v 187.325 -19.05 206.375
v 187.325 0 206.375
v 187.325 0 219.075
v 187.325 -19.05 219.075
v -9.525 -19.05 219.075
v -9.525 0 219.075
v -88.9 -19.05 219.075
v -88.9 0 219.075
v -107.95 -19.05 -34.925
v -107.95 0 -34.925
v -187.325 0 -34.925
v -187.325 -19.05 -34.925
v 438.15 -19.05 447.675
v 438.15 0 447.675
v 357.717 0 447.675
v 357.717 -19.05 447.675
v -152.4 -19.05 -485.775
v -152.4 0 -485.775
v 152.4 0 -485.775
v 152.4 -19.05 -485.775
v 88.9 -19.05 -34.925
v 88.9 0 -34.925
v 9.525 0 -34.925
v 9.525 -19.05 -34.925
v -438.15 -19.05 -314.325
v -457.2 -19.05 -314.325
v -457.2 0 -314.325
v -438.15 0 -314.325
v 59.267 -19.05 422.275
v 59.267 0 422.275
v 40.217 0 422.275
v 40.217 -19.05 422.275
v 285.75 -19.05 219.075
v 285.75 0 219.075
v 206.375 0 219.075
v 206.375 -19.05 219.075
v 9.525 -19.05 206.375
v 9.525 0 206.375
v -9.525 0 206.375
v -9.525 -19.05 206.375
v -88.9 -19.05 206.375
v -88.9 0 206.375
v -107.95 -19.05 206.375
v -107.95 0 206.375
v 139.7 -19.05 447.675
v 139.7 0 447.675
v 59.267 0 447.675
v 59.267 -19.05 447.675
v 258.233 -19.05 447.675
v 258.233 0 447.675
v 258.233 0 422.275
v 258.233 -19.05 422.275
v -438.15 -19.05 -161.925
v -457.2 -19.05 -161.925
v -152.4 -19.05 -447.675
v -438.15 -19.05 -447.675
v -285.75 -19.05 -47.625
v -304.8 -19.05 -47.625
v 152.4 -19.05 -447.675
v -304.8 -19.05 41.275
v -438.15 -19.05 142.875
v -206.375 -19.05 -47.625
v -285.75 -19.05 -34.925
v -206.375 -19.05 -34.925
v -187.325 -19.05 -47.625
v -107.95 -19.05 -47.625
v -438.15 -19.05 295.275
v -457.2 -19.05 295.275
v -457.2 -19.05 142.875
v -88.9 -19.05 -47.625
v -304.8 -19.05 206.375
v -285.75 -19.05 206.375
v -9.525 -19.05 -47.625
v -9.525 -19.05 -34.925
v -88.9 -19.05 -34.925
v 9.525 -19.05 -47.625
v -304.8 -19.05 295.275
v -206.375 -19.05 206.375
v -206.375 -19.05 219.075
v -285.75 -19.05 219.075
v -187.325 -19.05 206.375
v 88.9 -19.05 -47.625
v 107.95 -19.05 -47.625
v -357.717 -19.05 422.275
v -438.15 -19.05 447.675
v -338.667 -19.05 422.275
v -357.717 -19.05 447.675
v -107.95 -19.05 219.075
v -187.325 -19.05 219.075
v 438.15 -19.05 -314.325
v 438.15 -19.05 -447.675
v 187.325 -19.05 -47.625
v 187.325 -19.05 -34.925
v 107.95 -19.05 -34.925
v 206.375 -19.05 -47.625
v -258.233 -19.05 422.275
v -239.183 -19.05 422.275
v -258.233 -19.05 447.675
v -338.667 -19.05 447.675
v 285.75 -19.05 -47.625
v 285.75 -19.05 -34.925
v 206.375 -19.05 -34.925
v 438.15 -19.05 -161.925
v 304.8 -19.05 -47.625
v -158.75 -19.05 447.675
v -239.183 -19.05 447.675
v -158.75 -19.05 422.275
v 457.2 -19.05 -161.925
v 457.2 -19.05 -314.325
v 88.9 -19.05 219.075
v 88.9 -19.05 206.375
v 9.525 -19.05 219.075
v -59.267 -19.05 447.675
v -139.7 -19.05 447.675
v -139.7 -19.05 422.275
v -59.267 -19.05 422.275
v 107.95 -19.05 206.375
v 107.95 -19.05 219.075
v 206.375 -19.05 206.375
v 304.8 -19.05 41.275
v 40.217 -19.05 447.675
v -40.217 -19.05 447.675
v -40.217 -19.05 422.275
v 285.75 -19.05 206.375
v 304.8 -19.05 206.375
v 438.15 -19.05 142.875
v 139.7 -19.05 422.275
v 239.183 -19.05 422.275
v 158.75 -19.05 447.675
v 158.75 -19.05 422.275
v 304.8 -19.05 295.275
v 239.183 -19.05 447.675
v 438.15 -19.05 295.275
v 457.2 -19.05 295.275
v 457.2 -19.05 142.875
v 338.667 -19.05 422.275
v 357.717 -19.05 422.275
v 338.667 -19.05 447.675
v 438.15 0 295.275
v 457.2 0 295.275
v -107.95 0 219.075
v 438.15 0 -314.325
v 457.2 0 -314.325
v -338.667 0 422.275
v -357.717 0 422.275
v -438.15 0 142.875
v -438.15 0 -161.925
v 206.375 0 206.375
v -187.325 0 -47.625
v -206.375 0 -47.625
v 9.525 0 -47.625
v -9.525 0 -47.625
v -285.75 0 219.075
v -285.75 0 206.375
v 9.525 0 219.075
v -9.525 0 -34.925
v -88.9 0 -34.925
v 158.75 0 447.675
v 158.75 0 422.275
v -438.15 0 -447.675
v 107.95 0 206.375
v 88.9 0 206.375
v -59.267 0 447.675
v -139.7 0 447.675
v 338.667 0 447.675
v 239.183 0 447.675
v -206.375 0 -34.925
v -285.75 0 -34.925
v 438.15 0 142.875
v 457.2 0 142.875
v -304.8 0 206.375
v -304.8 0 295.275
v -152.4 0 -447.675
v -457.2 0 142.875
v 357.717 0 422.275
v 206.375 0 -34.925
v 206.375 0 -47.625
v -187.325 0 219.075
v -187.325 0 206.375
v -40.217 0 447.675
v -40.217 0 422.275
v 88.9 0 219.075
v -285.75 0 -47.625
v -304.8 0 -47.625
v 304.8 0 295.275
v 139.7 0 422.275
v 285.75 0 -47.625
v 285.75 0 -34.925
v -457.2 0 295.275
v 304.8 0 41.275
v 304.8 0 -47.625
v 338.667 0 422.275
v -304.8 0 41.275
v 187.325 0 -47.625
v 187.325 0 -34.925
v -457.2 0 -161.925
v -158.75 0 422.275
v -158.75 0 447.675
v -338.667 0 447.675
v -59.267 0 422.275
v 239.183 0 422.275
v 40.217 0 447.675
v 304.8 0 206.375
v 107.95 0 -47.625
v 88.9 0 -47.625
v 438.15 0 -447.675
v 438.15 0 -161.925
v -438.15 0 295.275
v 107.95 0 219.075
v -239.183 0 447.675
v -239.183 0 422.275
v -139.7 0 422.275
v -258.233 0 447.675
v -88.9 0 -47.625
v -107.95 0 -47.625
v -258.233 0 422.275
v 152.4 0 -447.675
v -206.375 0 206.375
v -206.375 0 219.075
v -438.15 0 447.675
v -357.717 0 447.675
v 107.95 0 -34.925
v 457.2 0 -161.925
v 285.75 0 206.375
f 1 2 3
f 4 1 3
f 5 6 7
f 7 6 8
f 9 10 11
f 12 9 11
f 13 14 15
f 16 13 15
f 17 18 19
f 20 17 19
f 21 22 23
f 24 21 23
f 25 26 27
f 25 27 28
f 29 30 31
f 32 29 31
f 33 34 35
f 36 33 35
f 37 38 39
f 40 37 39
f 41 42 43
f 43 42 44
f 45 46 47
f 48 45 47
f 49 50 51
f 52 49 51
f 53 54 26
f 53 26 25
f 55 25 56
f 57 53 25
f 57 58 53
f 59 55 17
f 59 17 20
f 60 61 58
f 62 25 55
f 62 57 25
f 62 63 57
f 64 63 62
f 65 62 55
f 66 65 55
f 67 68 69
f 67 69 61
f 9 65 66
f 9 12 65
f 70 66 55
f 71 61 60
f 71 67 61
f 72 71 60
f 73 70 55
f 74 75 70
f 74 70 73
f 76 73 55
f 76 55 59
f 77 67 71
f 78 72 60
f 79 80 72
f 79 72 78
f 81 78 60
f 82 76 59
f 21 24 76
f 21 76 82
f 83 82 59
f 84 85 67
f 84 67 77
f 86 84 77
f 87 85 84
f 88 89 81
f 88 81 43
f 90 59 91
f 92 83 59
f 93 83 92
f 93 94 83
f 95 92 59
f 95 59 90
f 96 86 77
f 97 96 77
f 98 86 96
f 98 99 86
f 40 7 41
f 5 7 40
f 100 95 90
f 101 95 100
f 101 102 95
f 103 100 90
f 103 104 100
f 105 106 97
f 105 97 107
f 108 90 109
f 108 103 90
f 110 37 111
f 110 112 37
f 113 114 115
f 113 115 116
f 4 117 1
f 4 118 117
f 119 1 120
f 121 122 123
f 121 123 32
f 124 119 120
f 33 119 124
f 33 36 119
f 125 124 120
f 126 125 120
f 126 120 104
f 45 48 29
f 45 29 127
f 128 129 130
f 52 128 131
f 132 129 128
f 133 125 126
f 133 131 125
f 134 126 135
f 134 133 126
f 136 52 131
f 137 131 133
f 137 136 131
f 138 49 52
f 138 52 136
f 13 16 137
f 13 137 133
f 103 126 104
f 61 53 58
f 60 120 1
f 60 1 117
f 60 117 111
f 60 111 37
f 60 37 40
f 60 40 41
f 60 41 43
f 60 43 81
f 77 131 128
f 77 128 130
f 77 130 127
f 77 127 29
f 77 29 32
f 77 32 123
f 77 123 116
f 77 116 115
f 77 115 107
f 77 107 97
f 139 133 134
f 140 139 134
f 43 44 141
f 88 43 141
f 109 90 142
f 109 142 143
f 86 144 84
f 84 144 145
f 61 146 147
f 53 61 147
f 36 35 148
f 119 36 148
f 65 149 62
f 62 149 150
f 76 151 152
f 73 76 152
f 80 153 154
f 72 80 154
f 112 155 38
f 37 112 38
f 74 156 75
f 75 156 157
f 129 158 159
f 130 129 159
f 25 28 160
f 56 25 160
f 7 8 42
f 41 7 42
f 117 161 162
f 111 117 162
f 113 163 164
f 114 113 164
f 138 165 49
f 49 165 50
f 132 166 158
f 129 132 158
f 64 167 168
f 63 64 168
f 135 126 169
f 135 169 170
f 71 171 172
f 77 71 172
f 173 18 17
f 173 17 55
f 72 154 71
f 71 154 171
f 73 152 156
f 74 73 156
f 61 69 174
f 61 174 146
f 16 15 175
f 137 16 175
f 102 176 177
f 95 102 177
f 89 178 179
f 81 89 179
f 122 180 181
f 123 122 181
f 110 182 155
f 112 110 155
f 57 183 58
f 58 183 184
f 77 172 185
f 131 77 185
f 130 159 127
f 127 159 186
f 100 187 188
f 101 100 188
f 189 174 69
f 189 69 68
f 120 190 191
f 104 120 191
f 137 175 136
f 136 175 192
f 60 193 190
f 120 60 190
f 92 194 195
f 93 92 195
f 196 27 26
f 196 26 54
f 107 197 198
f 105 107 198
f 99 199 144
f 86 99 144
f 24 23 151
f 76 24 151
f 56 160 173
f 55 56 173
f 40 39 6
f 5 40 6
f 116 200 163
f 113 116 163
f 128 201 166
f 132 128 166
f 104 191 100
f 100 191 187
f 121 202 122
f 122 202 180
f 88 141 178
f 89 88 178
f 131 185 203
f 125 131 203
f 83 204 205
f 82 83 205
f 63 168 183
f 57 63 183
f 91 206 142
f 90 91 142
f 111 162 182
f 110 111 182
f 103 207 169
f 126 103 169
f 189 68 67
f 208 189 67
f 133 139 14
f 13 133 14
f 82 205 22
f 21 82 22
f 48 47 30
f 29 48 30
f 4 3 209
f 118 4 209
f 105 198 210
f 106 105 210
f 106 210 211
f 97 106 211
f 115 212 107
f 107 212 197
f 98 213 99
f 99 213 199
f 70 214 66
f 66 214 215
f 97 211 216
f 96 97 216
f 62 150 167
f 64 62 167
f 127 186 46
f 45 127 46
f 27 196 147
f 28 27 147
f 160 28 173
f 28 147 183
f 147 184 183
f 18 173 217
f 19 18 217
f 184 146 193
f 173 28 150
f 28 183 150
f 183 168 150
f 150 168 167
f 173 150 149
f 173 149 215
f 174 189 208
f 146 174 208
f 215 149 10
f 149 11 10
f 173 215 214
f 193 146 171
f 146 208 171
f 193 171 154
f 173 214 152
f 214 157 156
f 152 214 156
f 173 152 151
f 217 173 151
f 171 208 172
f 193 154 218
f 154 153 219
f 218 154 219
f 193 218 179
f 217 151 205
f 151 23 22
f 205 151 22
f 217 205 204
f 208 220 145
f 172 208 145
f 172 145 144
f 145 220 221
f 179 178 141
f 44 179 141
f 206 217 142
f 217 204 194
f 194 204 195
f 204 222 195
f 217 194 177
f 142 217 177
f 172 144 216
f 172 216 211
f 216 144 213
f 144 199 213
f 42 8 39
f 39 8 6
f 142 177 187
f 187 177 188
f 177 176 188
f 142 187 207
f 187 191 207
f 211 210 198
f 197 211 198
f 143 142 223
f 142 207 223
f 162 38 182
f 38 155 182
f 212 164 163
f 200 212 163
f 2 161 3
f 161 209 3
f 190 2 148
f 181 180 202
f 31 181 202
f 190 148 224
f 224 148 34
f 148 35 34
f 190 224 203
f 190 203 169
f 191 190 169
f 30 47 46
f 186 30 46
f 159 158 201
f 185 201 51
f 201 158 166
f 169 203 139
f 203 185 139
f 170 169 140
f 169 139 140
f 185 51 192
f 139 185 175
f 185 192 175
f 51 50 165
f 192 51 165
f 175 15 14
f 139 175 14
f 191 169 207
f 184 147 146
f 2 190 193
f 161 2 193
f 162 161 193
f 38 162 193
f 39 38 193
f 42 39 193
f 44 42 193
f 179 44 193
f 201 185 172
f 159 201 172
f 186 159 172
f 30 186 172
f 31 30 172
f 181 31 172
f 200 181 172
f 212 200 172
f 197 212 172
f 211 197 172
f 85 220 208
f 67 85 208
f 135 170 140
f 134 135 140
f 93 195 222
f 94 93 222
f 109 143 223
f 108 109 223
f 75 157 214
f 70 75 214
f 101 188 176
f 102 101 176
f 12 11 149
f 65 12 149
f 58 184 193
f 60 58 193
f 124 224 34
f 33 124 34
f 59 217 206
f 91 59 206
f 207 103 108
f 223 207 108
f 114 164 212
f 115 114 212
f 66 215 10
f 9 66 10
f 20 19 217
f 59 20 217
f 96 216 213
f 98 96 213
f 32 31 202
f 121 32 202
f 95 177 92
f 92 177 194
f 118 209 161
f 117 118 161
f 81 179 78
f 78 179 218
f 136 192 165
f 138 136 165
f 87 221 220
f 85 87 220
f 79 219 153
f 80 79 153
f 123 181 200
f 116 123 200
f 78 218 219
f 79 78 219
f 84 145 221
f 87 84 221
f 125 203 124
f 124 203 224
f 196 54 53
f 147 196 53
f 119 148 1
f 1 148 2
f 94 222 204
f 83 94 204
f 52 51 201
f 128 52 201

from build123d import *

# Parameters (mm, degrees)
F0_W     = 19.05
F0_H     = 152.4
F0_W_2   = 304.8
F0_H_2   = 38.1
F1_DEPTH = 19.05


# Not quite as in the source:
# - a feature names something its author has since deleted; it is built from what else it names


with BuildPart() as f1:
    # F0 (on Front) → F1 (new body)
    with BuildSketch(Plane.XZ):
        Polygon((-438.15, -314.325), (-438.15, -447.675), (-152.4, -447.675), (152.4, -447.675), (438.15, -447.675), (438.15, -314.325), (438.15, -161.925), (438.15, 142.875), (438.15, 295.275), (438.15, 447.675), (357.7166666667, 447.675), (357.7166666667, 422.275), (338.6666666667, 422.275), (338.6666666667, 447.675), (258.2333333333, 447.675), (258.2333333333, 422.275), (239.1833333333, 422.275), (239.1833333333, 447.675), (158.75, 447.675), (158.75, 422.275), (139.7, 422.275), (139.7, 447.675), (59.266836, 447.675), (59.266836, 422.275), (40.216836, 422.275), (40.216836, 447.675), (-40.216836, 447.675), (-40.216836, 422.275), (-59.266836, 422.275), (-59.266836, 447.675), (-139.7, 447.675), (-139.7, 422.275), (-158.75, 422.275), (-158.75, 447.675), (-239.1833333333, 447.675), (-239.1833333333, 422.275), (-258.2333333333, 422.275), (-258.2333333333, 447.675), (-338.6666666667, 447.675), (-338.6666666667, 422.275), (-357.7166666667, 422.275), (-357.7166666667, 447.675), (-438.15, 447.675), (-438.15, 295.275), (-438.15, 142.875), (-438.15, -161.925), align=None)
        Polygon((-304.8, -47.625), (-304.8, -34.925), (-304.8, 41.275), (304.8, 41.275), (304.8, -34.925), (304.8, -47.625), (285.75, -47.625), (285.75, -34.925), (206.375, -34.925), (206.375, -47.625), (187.325, -47.625), (187.325, -34.925), (107.95, -34.925), (107.95, -47.625), (88.9, -47.625), (88.9, -34.925), (9.525, -34.925), (9.525, -47.625), (-9.525, -47.625), (-9.525, -34.925), (-88.9, -34.925), (-88.9, -47.625), (-107.95, -47.625), (-107.95, -34.925), (-187.325, -34.925), (-187.325, -47.625), (-206.375, -47.625), (-206.375, -34.925), (-285.75, -34.925), (-285.75, -47.625), align=None, mode=Mode.SUBTRACT)
        Polygon((-304.8, 295.275), (304.8, 295.275), (304.8, 219.075), (304.8, 206.375), (285.75, 206.375), (285.75, 219.075), (206.375, 219.075), (206.375, 206.375), (187.325, 206.375), (187.325, 219.075), (107.95, 219.075), (107.95, 206.375), (88.9, 206.375), (88.9, 219.075), (9.525, 219.075), (9.525, 206.375), (-9.525, 206.375), (-9.525, 219.075), (-88.9, 219.075), (-88.9, 206.375), (-107.95, 206.375), (-107.95, 219.075), (-187.325, 219.075), (-187.325, 206.375), (-206.375, 206.375), (-206.375, 219.075), (-285.75, 219.075), (-285.75, 206.375), (-304.8, 206.375), (-304.8, 219.075), align=None, mode=Mode.SUBTRACT)
        with Locations((-447.675, 219.075)):
            Rectangle(F0_W, F0_H)
        with Locations((-447.675, -238.125)):
            Rectangle(F0_W, F0_H)
        with Locations((447.675, 219.075)):
            Rectangle(F0_W, F0_H)
        with Locations((447.675, -238.125)):
            Rectangle(F0_W, F0_H)
        with Locations((0, -466.725)):
            Rectangle(F0_W_2, F0_H_2)
    extrude(amount=F1_DEPTH)


solid = f1.part
